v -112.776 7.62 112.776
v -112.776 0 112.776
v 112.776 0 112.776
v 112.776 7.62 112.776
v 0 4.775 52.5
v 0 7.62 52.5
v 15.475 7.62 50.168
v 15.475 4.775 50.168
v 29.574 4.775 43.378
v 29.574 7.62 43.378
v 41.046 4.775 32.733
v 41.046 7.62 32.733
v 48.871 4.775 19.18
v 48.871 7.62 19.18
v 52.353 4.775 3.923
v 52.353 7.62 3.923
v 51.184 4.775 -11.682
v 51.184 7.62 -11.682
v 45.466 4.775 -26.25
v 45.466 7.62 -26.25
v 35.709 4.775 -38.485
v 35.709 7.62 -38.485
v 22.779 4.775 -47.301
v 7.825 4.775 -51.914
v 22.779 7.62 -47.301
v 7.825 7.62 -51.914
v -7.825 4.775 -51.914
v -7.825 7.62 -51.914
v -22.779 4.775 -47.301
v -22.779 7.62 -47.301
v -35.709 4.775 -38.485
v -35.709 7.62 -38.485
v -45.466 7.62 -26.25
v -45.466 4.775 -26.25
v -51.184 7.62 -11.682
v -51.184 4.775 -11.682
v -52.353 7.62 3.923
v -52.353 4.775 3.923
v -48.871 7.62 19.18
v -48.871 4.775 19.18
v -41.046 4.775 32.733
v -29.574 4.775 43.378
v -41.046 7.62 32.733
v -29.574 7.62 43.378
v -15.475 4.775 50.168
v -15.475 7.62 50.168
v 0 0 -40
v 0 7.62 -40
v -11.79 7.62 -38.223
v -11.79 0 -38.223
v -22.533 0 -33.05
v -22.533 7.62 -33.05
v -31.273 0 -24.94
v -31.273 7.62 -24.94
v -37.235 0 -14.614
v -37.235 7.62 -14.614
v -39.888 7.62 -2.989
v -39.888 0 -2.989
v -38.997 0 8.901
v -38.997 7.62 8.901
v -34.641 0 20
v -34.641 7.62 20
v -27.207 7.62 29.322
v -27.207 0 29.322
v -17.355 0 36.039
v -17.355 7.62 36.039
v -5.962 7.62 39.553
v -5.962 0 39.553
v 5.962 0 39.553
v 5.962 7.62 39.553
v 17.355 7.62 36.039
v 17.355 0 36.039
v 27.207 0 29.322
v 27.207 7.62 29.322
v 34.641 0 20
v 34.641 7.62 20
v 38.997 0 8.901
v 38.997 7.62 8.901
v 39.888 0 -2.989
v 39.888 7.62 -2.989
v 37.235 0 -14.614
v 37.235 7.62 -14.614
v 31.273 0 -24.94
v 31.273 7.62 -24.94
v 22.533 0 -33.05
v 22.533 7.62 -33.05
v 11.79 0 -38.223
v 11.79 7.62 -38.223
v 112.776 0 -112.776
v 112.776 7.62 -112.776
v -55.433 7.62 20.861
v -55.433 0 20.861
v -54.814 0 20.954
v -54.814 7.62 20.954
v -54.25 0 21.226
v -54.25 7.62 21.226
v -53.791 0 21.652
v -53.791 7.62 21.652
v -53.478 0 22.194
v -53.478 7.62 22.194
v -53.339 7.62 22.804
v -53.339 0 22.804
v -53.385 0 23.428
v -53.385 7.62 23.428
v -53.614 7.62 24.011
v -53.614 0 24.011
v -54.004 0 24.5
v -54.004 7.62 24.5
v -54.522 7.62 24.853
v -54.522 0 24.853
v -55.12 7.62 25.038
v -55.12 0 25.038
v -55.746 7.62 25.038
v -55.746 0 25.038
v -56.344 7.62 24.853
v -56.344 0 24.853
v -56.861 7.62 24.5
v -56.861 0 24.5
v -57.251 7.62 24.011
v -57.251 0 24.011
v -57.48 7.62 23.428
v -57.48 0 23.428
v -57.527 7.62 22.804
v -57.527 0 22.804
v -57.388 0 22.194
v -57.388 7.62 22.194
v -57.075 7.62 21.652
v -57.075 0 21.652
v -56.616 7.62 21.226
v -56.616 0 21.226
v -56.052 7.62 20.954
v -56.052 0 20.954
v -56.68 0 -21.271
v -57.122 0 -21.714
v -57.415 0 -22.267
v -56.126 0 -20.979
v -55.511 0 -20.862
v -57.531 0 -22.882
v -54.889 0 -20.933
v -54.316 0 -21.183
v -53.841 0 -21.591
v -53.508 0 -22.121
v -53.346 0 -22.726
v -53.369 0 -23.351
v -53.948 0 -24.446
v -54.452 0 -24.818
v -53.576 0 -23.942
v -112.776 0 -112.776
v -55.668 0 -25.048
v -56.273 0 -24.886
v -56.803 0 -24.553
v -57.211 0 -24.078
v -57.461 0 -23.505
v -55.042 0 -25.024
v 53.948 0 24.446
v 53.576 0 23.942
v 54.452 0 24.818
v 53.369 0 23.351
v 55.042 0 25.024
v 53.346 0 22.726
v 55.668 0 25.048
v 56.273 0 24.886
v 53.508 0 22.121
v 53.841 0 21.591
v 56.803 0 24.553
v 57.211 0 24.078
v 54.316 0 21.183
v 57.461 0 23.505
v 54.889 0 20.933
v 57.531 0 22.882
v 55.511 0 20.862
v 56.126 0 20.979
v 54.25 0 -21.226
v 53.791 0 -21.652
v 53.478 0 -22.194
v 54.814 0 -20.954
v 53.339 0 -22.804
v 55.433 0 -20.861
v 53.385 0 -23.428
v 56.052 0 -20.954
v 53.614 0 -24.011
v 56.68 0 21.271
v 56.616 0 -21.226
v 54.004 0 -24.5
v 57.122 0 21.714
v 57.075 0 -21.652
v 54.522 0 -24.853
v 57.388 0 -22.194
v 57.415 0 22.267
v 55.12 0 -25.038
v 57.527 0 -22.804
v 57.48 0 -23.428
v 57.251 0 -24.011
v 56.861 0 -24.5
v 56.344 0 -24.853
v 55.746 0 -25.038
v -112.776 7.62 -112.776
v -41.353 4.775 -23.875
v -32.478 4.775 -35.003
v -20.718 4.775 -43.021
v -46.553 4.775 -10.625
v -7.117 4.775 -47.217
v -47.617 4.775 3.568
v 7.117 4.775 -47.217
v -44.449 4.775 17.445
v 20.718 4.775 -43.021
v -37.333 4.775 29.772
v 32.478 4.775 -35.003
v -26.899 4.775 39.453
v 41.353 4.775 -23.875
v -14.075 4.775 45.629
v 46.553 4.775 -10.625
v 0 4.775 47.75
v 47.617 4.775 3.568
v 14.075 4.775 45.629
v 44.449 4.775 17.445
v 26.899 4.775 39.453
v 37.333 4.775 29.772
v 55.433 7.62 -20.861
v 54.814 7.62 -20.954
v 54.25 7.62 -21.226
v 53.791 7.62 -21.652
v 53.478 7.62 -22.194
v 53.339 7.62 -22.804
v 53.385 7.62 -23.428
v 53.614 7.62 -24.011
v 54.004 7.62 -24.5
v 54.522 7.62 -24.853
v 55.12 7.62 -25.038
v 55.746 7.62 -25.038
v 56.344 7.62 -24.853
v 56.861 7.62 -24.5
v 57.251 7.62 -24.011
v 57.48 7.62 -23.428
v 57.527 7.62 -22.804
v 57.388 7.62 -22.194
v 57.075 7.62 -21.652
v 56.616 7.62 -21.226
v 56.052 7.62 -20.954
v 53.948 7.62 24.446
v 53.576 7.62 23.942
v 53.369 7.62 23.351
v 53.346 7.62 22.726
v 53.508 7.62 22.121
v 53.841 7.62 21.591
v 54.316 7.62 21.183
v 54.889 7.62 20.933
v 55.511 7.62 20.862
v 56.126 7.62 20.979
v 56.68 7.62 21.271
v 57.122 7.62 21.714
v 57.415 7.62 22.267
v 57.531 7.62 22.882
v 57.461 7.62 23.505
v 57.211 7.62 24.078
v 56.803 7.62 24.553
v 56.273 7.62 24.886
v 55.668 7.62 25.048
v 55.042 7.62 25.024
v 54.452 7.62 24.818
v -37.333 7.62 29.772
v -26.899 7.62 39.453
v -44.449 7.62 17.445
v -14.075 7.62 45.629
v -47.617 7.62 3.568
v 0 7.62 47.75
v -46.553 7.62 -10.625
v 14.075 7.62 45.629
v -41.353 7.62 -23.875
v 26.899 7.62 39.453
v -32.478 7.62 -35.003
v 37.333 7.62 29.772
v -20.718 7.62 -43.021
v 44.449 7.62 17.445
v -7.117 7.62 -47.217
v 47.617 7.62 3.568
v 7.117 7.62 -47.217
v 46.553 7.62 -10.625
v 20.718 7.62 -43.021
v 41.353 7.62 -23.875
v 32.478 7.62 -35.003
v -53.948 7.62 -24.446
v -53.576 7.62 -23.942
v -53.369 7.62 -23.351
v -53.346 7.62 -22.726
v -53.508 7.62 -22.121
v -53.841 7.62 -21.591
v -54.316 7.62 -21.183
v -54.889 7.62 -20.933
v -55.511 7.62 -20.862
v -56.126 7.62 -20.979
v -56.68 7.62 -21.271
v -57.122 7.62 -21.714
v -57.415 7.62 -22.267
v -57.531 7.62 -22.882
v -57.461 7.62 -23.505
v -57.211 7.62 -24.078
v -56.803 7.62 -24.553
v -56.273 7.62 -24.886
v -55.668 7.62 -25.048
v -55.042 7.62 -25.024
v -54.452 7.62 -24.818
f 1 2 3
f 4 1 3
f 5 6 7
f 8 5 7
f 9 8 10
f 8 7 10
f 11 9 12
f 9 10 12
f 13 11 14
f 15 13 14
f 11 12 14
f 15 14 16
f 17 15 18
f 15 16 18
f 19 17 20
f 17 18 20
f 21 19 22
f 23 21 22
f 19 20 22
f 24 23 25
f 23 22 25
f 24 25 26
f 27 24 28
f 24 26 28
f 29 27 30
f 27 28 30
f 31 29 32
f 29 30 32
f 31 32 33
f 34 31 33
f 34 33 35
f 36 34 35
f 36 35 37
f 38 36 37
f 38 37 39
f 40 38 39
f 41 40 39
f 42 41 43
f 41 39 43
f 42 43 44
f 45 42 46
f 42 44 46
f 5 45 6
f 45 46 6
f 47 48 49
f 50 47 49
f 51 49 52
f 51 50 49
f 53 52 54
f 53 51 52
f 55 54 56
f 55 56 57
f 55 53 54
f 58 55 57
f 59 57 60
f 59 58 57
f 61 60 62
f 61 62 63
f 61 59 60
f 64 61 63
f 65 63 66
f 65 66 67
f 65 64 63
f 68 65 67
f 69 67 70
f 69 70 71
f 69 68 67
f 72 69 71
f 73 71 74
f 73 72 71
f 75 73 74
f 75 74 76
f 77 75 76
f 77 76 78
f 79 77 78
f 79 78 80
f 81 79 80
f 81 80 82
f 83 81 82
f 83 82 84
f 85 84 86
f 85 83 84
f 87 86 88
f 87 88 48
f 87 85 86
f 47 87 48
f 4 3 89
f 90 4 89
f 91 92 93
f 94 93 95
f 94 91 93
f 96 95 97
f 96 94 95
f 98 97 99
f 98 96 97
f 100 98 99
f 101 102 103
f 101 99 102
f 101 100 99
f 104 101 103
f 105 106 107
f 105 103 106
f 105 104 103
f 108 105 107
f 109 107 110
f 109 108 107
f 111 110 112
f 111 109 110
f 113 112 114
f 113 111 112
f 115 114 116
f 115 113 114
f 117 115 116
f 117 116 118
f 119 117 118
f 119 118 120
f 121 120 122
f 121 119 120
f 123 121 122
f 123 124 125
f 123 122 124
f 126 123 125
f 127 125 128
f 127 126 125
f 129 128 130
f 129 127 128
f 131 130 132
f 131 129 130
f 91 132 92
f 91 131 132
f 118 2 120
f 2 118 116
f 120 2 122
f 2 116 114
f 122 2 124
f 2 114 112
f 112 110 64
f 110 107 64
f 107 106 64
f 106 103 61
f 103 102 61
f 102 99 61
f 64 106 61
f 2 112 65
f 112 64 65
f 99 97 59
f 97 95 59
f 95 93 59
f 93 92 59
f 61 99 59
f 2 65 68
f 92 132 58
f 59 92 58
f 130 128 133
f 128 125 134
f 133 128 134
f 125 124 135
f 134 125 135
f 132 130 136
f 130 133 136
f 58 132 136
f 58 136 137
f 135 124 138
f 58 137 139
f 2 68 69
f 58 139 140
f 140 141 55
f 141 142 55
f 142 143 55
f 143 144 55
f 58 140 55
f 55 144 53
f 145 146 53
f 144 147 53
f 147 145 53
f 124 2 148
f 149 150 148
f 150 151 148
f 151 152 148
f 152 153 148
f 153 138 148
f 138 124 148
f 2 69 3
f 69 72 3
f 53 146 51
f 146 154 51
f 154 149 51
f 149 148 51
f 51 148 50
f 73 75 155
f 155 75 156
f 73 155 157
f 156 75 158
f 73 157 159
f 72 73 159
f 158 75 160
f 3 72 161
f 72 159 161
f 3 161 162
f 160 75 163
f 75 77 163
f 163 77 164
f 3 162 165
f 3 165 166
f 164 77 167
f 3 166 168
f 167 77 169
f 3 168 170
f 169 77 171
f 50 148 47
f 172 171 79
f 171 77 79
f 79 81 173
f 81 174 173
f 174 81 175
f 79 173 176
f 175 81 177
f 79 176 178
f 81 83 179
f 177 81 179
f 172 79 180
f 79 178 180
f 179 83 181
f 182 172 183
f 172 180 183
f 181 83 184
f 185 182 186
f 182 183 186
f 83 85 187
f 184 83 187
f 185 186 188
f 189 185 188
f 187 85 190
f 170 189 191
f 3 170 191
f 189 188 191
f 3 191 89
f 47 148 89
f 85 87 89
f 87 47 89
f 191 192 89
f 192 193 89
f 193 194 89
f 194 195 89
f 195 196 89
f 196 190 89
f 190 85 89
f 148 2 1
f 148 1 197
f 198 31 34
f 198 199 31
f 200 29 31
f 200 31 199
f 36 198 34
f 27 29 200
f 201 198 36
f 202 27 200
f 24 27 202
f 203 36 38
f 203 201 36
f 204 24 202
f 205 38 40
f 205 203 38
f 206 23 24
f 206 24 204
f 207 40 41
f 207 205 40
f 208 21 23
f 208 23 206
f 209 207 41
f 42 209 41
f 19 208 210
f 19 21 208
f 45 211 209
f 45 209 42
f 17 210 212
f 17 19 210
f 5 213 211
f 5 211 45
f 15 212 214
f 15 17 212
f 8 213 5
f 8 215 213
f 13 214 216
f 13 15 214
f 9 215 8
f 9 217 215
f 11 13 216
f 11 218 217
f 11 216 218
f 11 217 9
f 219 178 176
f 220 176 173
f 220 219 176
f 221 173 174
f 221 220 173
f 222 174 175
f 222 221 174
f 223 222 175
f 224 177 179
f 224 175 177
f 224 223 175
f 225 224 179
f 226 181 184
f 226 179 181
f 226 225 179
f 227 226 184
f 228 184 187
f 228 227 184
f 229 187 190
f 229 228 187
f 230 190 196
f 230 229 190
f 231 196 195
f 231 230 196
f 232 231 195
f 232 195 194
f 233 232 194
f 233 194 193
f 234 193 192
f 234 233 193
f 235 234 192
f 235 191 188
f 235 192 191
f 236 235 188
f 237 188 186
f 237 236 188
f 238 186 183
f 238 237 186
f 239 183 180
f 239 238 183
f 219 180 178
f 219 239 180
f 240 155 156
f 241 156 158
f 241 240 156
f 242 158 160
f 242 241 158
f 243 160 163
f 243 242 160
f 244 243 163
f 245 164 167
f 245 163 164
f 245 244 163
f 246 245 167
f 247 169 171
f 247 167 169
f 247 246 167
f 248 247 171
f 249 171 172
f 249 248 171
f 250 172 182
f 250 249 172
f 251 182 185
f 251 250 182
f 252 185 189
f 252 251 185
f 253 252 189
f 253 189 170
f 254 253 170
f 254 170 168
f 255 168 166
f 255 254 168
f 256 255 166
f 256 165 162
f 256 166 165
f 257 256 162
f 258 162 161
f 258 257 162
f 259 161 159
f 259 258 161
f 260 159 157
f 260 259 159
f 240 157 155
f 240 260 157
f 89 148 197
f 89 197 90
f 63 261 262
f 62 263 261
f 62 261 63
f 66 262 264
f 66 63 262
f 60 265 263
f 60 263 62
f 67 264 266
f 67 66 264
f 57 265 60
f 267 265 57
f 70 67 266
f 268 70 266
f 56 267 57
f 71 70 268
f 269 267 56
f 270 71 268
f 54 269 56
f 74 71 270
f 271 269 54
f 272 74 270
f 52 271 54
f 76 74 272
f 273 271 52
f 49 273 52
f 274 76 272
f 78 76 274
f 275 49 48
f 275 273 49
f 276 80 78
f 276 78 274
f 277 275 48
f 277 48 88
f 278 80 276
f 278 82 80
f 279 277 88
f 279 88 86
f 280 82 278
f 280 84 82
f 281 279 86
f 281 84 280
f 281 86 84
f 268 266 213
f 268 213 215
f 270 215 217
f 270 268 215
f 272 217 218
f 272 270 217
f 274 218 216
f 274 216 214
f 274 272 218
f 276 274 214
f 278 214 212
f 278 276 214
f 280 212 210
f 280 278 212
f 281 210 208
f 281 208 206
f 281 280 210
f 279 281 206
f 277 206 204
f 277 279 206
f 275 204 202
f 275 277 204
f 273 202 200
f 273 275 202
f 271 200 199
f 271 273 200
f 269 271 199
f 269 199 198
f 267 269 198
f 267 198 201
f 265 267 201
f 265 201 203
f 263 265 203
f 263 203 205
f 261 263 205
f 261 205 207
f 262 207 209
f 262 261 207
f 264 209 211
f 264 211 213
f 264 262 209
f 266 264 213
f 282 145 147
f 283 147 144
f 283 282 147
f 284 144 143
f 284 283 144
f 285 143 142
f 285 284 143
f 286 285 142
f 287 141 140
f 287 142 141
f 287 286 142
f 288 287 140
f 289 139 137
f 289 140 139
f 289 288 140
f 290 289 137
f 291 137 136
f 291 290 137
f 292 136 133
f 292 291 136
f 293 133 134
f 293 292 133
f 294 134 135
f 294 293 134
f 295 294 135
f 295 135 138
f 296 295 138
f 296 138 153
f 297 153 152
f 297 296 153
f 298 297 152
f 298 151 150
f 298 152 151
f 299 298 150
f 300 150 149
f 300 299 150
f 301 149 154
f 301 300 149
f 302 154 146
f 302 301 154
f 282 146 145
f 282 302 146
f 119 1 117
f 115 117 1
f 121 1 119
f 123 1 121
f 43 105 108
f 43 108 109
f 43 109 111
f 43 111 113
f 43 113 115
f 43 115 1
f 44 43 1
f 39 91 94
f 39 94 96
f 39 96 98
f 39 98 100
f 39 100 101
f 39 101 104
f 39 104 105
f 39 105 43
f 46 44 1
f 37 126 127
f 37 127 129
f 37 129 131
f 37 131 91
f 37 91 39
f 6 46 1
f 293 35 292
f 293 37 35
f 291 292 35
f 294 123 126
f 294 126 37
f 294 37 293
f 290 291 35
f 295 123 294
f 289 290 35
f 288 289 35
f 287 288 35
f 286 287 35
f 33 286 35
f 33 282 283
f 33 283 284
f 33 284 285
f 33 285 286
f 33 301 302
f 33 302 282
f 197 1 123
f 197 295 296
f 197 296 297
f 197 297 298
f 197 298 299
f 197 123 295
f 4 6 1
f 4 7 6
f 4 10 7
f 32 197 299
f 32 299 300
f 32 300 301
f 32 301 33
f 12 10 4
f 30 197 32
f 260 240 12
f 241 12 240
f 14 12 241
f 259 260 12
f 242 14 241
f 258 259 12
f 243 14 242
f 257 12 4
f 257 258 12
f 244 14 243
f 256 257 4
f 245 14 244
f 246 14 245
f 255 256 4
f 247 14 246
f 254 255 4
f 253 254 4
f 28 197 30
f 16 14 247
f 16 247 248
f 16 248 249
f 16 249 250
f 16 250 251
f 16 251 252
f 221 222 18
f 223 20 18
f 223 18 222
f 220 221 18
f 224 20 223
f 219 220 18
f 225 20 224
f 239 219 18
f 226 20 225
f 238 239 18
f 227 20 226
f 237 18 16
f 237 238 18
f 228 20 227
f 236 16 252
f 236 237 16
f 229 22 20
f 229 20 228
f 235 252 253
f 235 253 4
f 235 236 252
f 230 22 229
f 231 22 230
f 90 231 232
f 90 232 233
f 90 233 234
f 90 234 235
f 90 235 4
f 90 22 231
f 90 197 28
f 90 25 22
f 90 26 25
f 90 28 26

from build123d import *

# Parameters (mm, degrees)
SKETCH1_W           = 225.552
SKETCH1_H           = 225.552
SKETCH1_R           = 52.5
SKETCH1_R_2         = 60
SKETCH1_R_3         = 47.7502
SKETCH1_R_4         = 40
BOSS_EXTRUDE1_DEPTH = 7.62
CUT_EXTRUDE1_START  = 7.62
SKETCH1_4_R         = 52.5
SKETCH1_4_R_2       = 47.7502
CUT_EXTRUDE1_DEPTH  = 2.8448
CIRPATTERN1_COUNT   = 16


with BuildPart() as part:
    # Sketch1 → Boss-Extrude1 (new body)
    with BuildSketch(Plane(origin=(0, 0, 0), x_dir=(1, 0, 0), z_dir=(0, 1, 0))):
        Rectangle(SKETCH1_W, SKETCH1_H)
        Circle(SKETCH1_R, mode=Mode.SUBTRACT)
        Circle(SKETCH1_R_2)
        Circle(SKETCH1_R, mode=Mode.SUBTRACT)
        Circle(SKETCH1_R)
        Circle(SKETCH1_R_3, mode=Mode.SUBTRACT)
        Circle(SKETCH1_R_3)
        with Locations(Location((0, 0, 0), (0, 0, 90))):
            Circle(SKETCH1_R_4, mode=Mode.SUBTRACT)
    extrude(amount=BOSS_EXTRUDE1_DEPTH)

    # Sketch1_4 → Cut-Extrude1 (cut)
    with BuildSketch(Plane(origin=(0, 0, 0), x_dir=(1, 0, 0), z_dir=(0, 1, 0)).offset(CUT_EXTRUDE1_START)):
        with Locations(Location((0, 0, 0), (0, 0, 270))):
            Circle(SKETCH1_4_R)
        with Locations(Location((0, 0, 0), (0, 0, 270))):
            Circle(SKETCH1_4_R_2, mode=Mode.SUBTRACT)
    extrude(amount=-CUT_EXTRUDE1_DEPTH, mode=Mode.SUBTRACT)

    # Sketch4 → M5x0.8 Tapped Hole2 (revolve, cut)
    with BuildSketch(Plane(origin=(55.432771951, 7.62, -22.961005942), x_dir=(0, 0, 1), z_dir=(1, 0, 0))):
        Polygon((0, 0), (0, 13.6618073), (2.1, 12.4), (2.1, 0), align=None)
    m5x0_8_tapped_hole2 = revolve(axis=Axis((55.432771951, 13.97, -22.961005942), (0, -1, 0)), mode=Mode.SUBTRACT)

    # CirPattern1: M5x0.8 Tapped Hole2 ×16 about axis, 12 skipped
    cirpattern1_axis = Axis((0, 7.62, 0), (0, 1, 0))
    add([m5x0_8_tapped_hole2.rotate(cirpattern1_axis, i * 360 / CIRPATTERN1_COUNT) for i in range(1, CIRPATTERN1_COUNT) if i not in (1, 2, 3, 4, 5, 7, 9, 10, 11, 12, 13, 15)], mode=Mode.SUBTRACT)


solid = part.part
